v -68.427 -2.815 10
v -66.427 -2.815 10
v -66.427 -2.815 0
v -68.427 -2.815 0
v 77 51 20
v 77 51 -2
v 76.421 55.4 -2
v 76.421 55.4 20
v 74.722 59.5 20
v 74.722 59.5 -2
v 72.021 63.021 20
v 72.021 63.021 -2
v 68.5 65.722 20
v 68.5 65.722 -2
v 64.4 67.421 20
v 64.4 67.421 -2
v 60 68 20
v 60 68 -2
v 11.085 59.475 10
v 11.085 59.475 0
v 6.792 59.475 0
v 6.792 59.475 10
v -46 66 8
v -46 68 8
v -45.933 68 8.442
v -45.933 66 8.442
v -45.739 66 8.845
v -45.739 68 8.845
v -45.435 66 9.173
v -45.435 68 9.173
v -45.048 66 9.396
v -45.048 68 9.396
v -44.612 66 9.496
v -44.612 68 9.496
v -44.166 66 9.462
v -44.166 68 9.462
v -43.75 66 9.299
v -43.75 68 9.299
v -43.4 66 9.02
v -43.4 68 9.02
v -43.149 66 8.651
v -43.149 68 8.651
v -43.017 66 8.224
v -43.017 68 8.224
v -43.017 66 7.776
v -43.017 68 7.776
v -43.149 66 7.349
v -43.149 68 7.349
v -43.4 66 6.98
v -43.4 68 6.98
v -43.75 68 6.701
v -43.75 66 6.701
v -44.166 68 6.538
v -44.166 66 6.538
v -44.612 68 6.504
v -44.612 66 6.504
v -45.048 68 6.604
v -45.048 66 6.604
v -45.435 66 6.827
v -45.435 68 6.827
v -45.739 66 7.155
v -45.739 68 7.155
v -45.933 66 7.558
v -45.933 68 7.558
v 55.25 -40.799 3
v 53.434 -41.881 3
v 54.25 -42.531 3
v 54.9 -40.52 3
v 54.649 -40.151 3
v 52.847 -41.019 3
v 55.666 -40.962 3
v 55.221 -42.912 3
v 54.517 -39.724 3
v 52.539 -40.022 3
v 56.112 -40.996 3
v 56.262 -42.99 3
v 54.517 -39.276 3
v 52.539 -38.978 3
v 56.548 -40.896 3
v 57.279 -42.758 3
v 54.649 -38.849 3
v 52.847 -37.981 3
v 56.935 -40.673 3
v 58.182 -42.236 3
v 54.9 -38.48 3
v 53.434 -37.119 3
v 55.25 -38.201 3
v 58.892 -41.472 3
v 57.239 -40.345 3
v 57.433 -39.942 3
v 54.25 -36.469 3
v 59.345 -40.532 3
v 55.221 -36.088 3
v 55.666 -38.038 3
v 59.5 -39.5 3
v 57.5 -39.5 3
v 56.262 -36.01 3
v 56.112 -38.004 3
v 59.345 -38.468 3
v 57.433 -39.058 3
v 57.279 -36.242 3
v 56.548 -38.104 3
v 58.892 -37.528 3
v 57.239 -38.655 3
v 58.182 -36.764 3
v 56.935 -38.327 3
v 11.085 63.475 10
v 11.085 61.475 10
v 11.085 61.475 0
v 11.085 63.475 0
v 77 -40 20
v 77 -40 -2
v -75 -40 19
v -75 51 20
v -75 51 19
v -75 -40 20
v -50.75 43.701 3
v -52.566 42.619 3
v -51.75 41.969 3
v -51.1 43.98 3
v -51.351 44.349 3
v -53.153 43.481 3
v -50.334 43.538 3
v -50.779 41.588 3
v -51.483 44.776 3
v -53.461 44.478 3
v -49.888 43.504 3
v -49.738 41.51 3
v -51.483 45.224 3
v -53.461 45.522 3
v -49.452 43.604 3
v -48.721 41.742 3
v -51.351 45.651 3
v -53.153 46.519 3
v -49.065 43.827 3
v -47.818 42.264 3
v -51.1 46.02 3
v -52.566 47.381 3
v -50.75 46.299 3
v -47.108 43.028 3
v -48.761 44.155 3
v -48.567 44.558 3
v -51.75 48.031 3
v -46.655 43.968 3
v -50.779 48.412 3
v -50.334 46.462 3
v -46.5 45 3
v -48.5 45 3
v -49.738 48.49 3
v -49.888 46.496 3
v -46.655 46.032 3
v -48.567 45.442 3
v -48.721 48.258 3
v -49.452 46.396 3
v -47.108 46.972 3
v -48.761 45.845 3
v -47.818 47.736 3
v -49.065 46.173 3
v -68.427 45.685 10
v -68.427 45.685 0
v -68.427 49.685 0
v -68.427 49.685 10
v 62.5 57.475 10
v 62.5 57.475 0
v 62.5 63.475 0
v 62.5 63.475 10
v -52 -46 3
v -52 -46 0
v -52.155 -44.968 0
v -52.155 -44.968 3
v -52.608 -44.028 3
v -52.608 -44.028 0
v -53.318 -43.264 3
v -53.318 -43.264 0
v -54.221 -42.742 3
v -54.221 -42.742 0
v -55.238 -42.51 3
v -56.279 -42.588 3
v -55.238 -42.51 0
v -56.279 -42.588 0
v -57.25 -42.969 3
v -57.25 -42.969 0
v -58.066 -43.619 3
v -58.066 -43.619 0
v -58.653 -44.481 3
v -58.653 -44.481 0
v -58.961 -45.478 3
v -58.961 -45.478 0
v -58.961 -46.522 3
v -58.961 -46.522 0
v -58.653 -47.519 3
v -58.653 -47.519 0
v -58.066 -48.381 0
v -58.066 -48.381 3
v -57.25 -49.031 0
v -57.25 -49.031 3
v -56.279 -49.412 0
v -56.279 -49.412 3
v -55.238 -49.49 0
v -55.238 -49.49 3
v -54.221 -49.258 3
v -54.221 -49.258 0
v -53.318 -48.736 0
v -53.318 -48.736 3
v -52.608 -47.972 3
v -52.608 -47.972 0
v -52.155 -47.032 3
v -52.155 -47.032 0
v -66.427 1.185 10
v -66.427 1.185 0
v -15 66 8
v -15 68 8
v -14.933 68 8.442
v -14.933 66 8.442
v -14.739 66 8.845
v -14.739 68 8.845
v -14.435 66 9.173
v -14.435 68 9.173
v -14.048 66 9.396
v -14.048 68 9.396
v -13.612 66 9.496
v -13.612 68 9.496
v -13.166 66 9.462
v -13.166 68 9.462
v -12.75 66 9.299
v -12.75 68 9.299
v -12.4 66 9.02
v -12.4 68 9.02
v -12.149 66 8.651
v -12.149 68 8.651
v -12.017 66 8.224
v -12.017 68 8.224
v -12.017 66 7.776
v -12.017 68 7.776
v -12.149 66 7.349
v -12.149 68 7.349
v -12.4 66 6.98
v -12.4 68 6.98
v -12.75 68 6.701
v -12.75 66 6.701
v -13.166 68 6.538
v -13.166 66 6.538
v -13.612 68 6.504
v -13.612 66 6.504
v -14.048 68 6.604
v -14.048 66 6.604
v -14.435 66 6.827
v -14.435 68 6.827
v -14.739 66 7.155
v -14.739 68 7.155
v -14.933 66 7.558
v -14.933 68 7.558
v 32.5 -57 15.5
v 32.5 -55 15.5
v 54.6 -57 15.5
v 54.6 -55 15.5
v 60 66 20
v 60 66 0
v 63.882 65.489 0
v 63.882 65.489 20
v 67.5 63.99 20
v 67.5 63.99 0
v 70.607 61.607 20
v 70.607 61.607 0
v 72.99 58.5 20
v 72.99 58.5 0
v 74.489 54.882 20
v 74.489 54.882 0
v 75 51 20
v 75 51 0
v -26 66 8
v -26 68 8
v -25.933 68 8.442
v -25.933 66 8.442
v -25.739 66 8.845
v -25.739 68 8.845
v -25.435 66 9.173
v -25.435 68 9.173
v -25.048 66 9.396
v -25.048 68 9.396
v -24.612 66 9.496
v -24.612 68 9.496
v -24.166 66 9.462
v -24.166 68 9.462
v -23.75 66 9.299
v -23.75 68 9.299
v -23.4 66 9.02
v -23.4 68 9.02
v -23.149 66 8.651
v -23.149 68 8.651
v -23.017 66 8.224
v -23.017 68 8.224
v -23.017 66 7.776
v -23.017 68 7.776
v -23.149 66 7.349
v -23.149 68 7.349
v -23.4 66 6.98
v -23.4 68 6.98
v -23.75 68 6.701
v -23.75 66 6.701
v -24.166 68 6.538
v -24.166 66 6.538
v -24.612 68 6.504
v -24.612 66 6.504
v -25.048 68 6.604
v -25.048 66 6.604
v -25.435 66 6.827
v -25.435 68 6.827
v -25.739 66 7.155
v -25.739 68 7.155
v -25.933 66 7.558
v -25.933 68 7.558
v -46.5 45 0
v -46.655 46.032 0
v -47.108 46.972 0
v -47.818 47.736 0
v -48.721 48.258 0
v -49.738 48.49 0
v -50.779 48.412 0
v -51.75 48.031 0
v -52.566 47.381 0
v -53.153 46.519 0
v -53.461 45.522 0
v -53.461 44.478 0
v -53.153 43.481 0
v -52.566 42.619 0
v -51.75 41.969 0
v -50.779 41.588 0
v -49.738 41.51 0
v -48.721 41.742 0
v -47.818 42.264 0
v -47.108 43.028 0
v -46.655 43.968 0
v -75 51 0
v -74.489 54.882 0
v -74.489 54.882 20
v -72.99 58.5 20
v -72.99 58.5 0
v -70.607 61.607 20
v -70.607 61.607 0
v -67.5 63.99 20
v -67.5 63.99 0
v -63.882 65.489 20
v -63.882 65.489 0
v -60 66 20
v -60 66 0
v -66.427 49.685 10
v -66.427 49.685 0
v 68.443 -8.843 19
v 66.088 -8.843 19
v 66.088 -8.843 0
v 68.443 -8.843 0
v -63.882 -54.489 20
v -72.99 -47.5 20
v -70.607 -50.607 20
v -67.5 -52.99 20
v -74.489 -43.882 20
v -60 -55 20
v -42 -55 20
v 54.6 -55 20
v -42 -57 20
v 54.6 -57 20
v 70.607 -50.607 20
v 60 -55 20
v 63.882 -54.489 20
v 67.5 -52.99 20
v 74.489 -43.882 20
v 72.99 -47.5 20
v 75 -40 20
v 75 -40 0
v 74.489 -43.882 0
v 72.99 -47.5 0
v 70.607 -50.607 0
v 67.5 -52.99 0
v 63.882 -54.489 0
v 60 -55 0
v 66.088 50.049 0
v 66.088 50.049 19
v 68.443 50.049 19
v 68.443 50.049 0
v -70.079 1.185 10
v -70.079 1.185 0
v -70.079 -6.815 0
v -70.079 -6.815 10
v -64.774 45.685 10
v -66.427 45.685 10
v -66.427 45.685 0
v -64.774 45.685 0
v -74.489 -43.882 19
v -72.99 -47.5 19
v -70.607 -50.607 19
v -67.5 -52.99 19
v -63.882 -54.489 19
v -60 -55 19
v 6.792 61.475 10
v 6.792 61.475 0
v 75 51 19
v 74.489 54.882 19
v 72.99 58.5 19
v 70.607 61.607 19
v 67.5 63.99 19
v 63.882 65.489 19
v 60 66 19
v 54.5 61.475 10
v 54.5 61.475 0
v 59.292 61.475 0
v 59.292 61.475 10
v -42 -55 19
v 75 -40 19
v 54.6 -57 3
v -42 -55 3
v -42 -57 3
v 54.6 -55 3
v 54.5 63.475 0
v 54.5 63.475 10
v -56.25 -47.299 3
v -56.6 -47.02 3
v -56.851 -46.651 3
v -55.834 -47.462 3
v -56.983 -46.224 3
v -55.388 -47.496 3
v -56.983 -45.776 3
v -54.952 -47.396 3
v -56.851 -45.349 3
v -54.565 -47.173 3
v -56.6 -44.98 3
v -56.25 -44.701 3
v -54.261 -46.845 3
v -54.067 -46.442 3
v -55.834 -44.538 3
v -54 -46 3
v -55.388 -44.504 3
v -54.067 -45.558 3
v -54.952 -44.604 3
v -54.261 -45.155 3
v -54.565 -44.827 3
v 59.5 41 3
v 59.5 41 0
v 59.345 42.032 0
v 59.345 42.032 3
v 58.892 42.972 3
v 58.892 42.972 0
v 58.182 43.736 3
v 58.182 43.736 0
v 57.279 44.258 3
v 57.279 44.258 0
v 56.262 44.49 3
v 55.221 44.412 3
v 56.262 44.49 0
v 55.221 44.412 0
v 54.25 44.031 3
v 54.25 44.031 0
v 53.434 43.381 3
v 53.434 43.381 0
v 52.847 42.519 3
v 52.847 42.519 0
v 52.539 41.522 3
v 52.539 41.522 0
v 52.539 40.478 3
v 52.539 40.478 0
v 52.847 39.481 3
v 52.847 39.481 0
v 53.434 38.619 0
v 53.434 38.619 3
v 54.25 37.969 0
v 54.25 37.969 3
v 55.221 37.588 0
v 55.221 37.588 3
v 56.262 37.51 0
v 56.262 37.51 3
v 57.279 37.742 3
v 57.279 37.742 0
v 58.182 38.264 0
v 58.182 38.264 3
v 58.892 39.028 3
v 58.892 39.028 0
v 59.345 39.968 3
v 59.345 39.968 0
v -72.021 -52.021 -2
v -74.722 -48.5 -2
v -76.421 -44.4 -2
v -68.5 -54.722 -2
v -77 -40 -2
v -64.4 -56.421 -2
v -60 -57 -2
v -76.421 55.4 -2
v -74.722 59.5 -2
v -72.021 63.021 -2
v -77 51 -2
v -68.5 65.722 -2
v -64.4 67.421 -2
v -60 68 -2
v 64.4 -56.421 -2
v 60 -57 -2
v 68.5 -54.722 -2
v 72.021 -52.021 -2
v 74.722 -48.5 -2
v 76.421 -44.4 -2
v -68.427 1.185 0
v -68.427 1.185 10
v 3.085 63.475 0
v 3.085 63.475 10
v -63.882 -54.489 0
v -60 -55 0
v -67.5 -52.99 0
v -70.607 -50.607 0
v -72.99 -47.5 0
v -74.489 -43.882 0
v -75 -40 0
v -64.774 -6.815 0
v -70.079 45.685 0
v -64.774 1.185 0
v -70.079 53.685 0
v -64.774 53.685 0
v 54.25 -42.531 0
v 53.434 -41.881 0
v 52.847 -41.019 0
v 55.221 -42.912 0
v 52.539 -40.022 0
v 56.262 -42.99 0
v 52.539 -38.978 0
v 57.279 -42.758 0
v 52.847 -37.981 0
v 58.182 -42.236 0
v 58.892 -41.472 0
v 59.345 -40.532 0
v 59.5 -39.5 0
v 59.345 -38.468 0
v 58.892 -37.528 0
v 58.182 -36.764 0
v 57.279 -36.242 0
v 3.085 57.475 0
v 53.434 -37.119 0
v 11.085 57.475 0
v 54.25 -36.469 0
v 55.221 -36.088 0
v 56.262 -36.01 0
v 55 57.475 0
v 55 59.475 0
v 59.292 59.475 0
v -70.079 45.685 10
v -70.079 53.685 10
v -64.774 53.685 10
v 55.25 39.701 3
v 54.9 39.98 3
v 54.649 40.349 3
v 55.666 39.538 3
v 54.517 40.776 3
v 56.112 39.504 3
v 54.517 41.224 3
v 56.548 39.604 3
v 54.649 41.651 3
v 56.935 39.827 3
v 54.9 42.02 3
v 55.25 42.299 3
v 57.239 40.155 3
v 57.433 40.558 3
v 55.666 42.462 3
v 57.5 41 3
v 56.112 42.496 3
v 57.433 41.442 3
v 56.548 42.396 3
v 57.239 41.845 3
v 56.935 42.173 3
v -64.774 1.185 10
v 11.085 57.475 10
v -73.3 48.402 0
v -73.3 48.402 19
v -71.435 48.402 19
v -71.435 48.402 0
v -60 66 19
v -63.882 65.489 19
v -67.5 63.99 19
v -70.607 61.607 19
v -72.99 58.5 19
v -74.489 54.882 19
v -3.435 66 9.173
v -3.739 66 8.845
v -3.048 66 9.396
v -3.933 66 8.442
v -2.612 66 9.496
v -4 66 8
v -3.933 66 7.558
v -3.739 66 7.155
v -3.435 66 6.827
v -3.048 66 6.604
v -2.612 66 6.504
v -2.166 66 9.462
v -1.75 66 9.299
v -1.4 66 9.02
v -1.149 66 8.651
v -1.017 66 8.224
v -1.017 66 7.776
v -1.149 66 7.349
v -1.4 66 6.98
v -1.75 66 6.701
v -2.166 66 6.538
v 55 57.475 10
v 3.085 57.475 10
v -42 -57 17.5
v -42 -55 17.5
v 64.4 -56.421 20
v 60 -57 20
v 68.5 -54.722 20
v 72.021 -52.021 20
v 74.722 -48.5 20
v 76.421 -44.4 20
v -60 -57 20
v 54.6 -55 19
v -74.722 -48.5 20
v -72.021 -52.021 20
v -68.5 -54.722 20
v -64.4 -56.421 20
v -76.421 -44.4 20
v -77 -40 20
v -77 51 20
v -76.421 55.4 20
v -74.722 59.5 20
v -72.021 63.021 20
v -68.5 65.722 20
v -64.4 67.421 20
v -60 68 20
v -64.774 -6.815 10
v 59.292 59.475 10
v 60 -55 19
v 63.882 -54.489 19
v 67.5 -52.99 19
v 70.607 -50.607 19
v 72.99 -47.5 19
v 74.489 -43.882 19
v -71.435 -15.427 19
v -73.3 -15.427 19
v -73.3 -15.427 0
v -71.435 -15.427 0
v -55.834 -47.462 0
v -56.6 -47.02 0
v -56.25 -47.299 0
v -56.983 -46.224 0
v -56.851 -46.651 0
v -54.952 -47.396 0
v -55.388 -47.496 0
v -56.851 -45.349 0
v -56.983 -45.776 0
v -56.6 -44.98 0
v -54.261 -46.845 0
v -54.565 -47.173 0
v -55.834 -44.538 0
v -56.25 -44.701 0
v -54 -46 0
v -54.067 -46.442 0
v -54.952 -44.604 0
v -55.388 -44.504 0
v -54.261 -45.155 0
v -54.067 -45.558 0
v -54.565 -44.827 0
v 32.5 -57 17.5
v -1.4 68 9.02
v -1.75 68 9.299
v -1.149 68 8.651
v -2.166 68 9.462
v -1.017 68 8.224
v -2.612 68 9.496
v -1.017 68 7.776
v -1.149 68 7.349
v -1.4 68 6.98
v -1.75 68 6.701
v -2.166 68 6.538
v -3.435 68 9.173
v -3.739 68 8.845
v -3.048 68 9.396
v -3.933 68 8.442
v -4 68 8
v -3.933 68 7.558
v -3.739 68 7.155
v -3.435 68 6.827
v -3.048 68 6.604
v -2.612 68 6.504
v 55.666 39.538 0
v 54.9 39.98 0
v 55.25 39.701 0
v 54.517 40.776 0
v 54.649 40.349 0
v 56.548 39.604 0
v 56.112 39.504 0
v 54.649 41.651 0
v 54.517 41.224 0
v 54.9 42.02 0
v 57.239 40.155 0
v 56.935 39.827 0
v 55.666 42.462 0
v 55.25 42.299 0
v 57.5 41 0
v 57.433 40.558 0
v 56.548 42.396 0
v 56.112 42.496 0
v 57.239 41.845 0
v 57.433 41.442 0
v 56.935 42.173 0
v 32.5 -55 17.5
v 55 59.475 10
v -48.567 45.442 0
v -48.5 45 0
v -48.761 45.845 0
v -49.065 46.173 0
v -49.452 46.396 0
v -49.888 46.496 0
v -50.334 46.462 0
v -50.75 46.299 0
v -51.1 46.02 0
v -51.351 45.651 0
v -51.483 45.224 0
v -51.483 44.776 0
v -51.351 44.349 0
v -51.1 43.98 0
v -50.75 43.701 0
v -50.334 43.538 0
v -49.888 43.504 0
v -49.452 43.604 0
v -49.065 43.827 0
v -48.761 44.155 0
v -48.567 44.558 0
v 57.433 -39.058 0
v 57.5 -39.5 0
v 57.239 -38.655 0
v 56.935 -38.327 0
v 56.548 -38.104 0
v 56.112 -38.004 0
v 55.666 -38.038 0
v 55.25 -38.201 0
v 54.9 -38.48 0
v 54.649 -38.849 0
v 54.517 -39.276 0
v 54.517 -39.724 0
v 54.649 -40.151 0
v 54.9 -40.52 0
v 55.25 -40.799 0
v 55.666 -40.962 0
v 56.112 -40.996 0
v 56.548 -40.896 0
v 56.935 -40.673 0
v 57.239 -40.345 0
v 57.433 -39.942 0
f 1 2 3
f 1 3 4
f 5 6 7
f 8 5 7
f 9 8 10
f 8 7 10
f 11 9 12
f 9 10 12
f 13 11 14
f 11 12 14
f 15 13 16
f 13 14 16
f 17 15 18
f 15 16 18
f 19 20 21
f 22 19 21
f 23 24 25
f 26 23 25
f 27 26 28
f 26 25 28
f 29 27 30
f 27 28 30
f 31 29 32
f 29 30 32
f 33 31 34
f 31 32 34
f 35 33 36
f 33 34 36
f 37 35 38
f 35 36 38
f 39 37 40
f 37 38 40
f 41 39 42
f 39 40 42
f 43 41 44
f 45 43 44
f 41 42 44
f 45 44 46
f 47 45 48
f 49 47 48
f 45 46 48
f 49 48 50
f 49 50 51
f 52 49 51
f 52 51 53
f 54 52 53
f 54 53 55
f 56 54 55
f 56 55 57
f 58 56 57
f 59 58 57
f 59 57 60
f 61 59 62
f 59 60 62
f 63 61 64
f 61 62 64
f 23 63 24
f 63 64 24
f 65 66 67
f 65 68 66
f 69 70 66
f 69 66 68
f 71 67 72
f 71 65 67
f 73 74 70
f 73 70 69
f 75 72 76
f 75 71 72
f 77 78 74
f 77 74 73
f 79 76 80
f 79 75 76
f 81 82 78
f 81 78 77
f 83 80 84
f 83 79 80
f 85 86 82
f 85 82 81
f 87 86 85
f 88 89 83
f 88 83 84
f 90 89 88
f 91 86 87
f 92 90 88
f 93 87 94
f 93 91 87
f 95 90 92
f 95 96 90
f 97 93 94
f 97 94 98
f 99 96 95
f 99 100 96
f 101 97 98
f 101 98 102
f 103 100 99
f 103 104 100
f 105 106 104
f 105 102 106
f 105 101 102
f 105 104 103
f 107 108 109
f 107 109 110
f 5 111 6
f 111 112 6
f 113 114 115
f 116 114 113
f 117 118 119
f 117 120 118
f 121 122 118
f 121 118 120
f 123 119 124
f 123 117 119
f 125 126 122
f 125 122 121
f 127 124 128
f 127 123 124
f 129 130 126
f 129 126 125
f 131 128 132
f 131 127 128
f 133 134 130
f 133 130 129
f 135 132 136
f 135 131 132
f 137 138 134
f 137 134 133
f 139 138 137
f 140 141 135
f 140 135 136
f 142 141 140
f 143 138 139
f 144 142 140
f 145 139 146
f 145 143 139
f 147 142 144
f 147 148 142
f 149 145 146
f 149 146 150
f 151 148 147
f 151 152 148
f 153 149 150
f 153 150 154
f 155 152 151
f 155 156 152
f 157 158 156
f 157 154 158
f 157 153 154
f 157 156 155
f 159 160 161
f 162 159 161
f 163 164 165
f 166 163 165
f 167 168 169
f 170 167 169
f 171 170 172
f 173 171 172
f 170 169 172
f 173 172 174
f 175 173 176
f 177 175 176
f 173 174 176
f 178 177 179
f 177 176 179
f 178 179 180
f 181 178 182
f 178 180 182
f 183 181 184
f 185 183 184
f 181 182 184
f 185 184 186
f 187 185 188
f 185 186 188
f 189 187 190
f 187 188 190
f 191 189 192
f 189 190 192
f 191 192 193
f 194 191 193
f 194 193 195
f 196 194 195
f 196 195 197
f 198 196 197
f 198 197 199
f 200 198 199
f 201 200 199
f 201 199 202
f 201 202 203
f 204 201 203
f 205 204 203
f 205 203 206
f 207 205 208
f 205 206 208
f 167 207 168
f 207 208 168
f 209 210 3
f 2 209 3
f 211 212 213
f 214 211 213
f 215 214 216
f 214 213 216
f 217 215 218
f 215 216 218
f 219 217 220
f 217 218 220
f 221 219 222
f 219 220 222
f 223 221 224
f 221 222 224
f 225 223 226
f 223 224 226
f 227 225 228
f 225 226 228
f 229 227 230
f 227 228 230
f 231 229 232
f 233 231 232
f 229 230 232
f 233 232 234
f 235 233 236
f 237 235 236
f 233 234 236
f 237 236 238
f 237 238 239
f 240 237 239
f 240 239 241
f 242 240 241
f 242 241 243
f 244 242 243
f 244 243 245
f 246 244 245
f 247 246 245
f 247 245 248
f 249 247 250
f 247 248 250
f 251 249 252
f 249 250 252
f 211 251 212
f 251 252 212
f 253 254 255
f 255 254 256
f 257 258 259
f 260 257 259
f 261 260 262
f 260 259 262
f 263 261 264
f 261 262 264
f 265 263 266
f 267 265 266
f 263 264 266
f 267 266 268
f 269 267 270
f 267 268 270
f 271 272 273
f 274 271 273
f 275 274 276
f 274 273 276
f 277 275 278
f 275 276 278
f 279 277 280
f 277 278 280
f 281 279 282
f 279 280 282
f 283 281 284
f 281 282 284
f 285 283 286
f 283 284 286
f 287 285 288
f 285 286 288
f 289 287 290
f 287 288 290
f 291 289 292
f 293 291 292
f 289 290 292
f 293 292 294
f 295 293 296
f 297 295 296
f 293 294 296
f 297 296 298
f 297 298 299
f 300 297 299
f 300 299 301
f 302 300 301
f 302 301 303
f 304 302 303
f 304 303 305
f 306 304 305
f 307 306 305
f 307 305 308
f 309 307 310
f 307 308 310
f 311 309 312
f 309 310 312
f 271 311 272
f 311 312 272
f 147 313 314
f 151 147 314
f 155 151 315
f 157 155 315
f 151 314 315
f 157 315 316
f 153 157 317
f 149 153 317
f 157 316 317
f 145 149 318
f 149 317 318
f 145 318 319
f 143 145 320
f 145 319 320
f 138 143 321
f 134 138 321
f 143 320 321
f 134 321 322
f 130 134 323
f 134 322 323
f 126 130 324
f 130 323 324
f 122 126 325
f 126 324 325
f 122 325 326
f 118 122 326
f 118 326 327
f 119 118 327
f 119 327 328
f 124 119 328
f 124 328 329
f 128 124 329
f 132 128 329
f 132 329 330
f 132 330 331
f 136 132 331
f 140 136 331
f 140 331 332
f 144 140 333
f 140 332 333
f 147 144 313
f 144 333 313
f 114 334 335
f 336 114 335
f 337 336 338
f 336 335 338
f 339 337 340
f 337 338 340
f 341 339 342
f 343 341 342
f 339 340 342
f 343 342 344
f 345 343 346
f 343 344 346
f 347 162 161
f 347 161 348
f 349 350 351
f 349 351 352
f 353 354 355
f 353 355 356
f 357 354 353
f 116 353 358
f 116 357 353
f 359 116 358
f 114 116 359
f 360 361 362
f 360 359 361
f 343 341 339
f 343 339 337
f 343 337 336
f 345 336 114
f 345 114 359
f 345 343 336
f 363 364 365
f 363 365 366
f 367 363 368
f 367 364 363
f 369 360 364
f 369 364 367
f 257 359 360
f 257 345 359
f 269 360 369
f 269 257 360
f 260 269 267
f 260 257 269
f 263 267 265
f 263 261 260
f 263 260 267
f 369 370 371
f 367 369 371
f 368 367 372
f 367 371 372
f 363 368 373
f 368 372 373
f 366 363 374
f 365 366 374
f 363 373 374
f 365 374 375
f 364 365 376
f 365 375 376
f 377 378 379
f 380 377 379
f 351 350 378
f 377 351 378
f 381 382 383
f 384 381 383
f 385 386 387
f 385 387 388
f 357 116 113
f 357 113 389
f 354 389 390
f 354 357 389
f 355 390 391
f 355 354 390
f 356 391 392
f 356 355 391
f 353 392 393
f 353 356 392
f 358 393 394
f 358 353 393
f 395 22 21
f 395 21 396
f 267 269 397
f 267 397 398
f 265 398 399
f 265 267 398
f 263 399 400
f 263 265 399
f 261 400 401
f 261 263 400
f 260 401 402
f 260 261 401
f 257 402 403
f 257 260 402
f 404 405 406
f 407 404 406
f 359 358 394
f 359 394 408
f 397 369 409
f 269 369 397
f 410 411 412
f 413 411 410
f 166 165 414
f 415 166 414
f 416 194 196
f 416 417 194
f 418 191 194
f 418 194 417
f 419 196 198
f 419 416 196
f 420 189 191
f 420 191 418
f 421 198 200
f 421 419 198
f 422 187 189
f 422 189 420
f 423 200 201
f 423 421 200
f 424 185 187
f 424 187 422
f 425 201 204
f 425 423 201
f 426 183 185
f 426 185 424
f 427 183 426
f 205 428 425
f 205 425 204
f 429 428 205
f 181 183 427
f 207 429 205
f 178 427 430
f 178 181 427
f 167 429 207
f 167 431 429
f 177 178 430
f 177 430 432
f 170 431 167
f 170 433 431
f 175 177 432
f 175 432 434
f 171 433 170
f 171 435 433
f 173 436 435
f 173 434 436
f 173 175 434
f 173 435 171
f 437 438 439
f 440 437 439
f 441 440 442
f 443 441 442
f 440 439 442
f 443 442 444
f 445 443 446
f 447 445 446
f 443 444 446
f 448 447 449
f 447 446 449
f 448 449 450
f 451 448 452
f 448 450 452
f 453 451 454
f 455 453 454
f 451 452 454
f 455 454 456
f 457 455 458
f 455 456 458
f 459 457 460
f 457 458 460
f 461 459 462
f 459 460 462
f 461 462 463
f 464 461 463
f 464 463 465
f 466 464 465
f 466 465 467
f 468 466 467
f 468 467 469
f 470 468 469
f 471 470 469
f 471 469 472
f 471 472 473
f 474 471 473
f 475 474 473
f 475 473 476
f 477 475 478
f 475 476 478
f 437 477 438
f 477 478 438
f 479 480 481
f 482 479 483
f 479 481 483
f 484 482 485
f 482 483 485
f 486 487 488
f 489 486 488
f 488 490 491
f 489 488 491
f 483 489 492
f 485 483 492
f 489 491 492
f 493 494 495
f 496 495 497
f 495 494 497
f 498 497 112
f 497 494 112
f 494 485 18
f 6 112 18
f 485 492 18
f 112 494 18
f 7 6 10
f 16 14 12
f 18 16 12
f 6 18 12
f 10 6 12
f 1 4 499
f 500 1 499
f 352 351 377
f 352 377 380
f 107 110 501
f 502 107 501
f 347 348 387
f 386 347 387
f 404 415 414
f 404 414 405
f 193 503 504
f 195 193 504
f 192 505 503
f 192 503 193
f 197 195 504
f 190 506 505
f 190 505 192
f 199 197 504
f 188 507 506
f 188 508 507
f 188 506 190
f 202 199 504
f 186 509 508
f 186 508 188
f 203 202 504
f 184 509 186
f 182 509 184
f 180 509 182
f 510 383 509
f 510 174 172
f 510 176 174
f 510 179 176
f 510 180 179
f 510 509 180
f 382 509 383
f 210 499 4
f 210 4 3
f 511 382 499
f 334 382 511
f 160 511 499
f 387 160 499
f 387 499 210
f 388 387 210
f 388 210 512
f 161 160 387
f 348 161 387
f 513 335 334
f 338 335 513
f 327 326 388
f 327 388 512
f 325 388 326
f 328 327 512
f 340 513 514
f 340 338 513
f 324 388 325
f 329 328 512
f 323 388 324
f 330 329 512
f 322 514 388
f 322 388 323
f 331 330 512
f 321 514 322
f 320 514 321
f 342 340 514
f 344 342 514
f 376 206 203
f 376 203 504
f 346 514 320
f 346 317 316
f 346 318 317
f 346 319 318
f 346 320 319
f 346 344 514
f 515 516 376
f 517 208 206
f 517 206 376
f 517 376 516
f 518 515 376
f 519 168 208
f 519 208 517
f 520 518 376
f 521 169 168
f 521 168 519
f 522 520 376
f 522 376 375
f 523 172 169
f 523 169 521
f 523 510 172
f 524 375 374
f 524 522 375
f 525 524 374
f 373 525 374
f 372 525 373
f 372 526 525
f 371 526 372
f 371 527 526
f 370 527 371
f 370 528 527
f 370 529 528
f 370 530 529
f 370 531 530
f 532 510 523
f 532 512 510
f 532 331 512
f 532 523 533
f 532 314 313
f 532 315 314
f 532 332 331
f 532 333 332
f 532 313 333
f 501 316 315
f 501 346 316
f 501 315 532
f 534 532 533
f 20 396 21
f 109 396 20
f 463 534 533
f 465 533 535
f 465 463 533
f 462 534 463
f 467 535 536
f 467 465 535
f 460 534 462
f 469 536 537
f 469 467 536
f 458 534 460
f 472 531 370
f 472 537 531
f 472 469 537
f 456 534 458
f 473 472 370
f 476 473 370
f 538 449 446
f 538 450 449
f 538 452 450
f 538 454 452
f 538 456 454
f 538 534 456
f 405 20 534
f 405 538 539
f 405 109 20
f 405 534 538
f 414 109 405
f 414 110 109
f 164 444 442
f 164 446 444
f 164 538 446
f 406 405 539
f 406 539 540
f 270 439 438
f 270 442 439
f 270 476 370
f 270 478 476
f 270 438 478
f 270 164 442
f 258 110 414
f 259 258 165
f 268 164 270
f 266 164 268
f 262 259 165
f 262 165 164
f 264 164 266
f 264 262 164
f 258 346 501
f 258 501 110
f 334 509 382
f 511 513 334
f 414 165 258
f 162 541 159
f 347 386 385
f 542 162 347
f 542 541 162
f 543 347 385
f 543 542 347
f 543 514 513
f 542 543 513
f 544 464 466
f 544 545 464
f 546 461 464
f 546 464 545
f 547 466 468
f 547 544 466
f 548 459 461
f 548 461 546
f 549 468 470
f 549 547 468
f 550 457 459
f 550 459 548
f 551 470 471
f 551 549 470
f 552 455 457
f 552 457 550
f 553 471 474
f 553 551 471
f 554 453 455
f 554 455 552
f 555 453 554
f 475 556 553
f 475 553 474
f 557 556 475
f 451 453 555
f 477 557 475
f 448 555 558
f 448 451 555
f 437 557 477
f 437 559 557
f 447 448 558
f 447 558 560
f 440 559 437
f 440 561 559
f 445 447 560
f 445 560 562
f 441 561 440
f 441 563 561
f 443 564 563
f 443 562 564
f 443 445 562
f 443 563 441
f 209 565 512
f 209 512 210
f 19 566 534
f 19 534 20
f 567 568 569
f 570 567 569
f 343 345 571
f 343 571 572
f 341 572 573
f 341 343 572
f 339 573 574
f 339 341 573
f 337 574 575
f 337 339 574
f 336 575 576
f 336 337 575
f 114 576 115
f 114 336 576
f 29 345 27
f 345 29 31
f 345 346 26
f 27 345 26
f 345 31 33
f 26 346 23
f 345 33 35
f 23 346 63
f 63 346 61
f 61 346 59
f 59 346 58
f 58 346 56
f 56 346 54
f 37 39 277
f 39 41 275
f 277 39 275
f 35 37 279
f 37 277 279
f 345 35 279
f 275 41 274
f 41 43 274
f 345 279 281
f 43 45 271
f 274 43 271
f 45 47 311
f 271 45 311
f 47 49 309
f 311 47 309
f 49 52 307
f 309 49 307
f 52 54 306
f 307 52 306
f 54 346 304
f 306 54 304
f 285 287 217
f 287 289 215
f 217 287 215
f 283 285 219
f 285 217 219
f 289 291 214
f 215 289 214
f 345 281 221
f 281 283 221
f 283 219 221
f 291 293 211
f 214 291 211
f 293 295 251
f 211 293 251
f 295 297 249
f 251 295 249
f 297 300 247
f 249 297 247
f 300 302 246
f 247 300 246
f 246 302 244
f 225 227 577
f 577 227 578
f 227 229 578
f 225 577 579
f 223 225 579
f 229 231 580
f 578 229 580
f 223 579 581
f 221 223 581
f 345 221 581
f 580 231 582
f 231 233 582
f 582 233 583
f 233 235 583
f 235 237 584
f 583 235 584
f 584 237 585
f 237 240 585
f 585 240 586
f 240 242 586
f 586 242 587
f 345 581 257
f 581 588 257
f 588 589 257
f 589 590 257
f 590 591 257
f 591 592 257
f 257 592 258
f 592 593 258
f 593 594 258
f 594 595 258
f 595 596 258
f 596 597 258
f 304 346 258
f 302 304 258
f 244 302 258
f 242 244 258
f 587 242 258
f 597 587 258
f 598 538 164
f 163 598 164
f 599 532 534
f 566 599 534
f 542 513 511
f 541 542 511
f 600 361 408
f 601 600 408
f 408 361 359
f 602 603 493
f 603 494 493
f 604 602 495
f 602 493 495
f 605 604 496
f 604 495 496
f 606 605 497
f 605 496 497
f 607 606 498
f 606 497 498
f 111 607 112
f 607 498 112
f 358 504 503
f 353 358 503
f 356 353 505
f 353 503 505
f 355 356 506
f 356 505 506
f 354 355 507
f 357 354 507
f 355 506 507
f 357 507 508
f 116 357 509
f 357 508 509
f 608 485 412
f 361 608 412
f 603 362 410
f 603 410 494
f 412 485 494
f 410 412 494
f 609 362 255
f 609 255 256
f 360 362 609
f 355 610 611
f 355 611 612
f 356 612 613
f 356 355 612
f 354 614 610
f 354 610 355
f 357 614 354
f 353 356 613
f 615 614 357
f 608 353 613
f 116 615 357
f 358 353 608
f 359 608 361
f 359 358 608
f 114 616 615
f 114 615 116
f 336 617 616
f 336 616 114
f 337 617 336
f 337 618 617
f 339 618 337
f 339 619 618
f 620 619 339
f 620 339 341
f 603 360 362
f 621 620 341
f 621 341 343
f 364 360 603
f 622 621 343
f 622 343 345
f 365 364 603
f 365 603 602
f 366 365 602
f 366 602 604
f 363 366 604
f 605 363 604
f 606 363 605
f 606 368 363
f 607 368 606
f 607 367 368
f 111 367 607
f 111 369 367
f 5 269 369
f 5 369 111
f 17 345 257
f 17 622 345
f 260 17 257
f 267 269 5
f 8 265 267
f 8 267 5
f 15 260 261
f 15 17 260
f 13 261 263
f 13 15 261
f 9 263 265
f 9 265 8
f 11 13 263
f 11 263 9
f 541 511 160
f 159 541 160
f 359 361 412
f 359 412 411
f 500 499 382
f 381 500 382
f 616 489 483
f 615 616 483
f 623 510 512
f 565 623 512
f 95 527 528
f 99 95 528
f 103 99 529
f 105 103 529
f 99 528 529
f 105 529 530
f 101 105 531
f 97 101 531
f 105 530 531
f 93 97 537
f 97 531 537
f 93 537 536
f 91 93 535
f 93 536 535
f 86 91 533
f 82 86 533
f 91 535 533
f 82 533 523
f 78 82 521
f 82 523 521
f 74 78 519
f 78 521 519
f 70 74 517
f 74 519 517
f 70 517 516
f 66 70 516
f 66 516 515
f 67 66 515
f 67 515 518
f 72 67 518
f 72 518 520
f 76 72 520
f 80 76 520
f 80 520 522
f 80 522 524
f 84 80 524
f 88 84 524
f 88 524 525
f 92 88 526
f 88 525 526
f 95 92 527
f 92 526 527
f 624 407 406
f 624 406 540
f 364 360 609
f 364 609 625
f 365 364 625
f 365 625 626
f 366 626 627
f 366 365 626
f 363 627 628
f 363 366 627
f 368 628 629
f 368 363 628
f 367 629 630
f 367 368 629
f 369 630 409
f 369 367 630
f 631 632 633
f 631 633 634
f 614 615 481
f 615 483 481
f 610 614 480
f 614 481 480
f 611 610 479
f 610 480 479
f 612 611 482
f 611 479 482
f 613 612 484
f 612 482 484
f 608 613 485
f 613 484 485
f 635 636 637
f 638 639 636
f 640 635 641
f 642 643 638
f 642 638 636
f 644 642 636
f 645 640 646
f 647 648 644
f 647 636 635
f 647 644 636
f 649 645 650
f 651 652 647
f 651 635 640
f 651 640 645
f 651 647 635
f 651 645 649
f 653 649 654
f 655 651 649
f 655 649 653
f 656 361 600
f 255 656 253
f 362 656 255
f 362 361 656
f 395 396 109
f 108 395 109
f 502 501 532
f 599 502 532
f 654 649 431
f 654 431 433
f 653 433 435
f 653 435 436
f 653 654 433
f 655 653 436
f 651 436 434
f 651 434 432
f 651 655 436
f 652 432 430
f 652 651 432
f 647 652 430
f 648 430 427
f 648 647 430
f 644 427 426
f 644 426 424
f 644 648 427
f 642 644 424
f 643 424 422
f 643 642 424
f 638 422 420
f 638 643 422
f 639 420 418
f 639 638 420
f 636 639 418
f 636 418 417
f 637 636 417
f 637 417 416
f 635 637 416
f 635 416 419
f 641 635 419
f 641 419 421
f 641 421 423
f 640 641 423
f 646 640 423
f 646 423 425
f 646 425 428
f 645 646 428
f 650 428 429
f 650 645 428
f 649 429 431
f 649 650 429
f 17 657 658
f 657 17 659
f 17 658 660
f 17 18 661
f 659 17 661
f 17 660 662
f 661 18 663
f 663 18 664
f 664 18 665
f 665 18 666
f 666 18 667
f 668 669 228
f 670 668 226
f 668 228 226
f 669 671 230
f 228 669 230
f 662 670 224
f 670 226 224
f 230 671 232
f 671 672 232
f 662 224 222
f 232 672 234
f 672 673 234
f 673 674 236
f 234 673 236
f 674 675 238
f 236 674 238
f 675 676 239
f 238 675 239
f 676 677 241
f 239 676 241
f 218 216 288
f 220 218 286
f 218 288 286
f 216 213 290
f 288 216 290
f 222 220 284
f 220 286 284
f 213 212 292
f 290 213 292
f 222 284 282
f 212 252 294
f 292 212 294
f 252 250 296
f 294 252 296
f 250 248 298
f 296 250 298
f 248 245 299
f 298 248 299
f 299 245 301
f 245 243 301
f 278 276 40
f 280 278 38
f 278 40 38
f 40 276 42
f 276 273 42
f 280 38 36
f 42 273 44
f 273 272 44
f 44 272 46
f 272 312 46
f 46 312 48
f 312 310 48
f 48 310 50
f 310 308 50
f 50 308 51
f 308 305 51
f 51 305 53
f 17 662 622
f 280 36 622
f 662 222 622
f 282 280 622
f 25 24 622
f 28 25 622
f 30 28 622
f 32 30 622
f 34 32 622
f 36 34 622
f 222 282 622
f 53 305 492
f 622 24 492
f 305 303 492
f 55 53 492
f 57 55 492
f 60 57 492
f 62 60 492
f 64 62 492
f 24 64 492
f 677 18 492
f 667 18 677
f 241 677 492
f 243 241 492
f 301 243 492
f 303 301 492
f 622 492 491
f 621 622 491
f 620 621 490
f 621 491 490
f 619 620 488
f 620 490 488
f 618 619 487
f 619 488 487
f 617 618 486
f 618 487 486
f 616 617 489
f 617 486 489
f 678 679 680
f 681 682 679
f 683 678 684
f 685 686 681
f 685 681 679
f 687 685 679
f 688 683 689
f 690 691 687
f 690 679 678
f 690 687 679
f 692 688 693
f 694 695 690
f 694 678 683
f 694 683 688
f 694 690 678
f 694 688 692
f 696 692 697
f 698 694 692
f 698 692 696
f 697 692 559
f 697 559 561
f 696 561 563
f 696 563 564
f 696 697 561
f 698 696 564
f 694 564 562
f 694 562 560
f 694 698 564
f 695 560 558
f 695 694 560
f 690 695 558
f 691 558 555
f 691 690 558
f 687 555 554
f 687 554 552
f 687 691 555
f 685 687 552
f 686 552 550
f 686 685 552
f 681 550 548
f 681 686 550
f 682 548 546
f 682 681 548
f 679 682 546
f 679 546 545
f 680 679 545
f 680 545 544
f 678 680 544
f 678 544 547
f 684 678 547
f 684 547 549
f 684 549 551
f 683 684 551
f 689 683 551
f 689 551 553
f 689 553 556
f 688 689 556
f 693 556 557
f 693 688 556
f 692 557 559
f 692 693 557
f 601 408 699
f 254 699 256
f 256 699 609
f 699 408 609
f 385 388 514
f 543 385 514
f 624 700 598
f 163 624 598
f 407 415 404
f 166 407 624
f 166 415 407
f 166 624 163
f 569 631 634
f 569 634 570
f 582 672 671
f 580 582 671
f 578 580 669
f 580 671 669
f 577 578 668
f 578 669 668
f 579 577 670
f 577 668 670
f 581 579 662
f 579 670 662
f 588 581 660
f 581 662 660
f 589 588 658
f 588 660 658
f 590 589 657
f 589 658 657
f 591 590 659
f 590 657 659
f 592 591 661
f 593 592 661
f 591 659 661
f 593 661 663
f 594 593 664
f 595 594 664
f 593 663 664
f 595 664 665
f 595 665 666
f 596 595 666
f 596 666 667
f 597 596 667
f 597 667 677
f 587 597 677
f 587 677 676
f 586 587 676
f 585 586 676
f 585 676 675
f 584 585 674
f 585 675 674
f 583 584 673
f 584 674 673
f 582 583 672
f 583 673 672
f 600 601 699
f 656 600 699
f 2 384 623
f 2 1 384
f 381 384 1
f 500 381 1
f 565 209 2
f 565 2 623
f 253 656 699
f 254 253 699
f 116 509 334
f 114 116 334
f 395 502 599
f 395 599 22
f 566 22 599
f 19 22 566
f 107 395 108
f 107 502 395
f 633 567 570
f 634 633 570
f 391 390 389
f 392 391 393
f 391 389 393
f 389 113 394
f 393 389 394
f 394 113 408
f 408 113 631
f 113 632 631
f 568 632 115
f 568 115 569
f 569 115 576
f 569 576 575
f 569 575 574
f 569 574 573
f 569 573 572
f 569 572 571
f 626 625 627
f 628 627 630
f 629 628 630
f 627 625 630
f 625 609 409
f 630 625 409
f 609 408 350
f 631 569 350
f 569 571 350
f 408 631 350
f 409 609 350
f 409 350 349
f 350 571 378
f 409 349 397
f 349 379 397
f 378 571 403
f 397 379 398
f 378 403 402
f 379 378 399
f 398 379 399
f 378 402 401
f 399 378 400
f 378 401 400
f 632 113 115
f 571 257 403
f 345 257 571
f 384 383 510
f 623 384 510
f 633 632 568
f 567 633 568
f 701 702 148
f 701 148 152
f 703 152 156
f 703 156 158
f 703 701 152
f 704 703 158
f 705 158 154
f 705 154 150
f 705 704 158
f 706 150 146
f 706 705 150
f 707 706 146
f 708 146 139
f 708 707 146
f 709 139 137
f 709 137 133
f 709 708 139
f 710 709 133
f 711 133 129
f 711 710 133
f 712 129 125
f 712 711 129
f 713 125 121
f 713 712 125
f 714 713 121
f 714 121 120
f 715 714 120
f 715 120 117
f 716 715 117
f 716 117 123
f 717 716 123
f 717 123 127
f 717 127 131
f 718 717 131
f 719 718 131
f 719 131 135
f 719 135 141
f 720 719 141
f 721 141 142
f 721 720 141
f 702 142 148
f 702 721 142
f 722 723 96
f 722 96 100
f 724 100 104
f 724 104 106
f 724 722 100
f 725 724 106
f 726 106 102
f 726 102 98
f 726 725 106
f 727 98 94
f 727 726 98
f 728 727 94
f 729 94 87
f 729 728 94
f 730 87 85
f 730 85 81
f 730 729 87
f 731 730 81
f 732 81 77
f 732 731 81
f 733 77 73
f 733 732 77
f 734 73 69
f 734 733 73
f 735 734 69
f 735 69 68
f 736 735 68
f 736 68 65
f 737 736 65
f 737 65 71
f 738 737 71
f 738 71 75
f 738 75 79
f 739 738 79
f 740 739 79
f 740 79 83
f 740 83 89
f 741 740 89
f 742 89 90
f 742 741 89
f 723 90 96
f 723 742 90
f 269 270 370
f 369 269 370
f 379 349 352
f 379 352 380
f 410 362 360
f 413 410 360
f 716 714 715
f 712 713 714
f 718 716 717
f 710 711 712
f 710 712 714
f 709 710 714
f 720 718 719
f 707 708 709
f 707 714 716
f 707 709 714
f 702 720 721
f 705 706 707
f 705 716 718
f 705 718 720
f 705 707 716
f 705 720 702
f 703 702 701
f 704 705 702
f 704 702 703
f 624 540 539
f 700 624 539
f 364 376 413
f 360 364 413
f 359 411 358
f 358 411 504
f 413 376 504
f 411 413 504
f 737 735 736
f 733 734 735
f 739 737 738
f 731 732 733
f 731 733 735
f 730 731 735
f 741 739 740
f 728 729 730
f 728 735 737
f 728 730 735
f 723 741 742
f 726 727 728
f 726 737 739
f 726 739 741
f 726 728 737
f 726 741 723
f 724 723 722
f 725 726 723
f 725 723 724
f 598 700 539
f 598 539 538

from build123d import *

# Parameters (mm, degrees)
F0_W      = 120
F0_H      = 110
F0_R      = 3.5
F0_R_2    = 1.5
F1_DEPTH  = 2
F2_DEPTH  = 20
F3_DEPTH  = 3
F4_DEPTH  = 10
F5_W      = 96.6
F5_H      = 2
F6_DEPTH  = 17
F7_R      = 1.5
F8_DEPTH  = 2
F9_W      = 1.8643289804
F9_H      = 63.8286471367
F9_W_2    = 2.3556724191
F9_H_2    = 58.8918318972
F10_DEPTH = 1
F9_W_3    = 74.5
F9_H_3    = 2
F11_DEPTH = 2.5
F9_W_4    = 22.1
F12_DEPTH = 4.5
F13_DEPTH = 20


with BuildPart() as f1:
    # F0 (on Top) → F1 (new body)
    with BuildSketch(Plane.XY):
        with BuildLine():
            Line((-77, 51), (-77, -40))
            ThreePointArc((-77, -40), (-72.0208152802, -52.0208152802), (-60, -57))
            Line((-60, -57), (60, -57))
            ThreePointArc((60, -57), (72.0208152802, -52.0208152802), (77, -40))
            Line((77, -40), (77, 51))
            ThreePointArc((77, 51), (72.0208152802, 63.0208152802), (60, 68))
            Line((60, 68), (-60, 68))
            ThreePointArc((-60, 68), (-72.0208152802, 63.0208152802), (-77, 51))
        make_face()
        with BuildLine():
            Line((60, -55), (-60, -55))
            ThreePointArc((-60, -55), (-70.6066017178, -50.6066017178), (-75, -40))
            Line((-75, -40), (-75, 51))
            ThreePointArc((-75, 51), (-70.6066017178, 61.6066017178), (-60, 66))
            Line((-60, 66), (60, 66))
            ThreePointArc((60, 66), (70.6066017178, 61.6066017178), (75, 51))
            Line((75, 51), (75, -40))
            ThreePointArc((75, -40), (70.6066017178, -50.6066017178), (60, -55))
        make_face(mode=Mode.SUBTRACT)
        Rectangle(F0_W, F0_H)
        with Locations((-55.5, -46)):
            Circle(F0_R, mode=Mode.SUBTRACT)
        with Locations((56, -39.5)):
            Circle(F0_R, mode=Mode.SUBTRACT)
        with Locations((-50, 45)):
            Circle(F0_R, mode=Mode.SUBTRACT)
        with Locations((56, 41)):
            Circle(F0_R, mode=Mode.SUBTRACT)
        with BuildLine():
            ThreePointArc((-75, -40), (-70.6066017178, -50.6066017178), (-60, -55))
            Line((-60, -55), (-60, 55))
            Line((-60, 55), (60, 55))
            Line((60, 55), (60, -55))
            ThreePointArc((60, -55), (70.6066017178, -50.6066017178), (75, -40))
            Line((75, -40), (75, 51))
            ThreePointArc((75, 51), (70.6066017178, 61.6066017178), (60, 66))
            Line((60, 66), (-60, 66))
            ThreePointArc((-60, 66), (-70.6066017178, 61.6066017178), (-75, 51))
            Line((-75, 51), (-75, -40))
        make_face()
        Polygon((-68.426687021, -2.8152682781), (-66.426687021, -2.8152682781), (-66.426687021, 1.1847317219), (-64.77445364, 1.1847317219), (-64.77445364, -6.8152682781), (-70.078920402, -6.8152682781), (-70.078920402, 1.1847317219), (-68.426687021, 1.1847317219), align=None, mode=Mode.SUBTRACT)
        Polygon((-68.426687021, 45.6847317219), (-70.078920402, 45.6847317219), (-70.078920402, 53.6847317219), (-64.77445364, 53.6847317219), (-64.77445364, 45.6847317219), (-66.426687021, 45.6847317219), (-66.426687021, 49.6847317219), (-68.426687021, 49.6847317219), align=None, mode=Mode.SUBTRACT)
        Polygon((11.0850978998, 61.4750083983), (6.792485714, 61.4750083983), (6.792485714, 59.4750083983), (11.0850978998, 59.4750083983), (11.0850978998, 57.4750083983), (3.0850978998, 57.4750083983), (3.0850978998, 63.4750083983), (11.0850978998, 63.4750083983), align=None, mode=Mode.SUBTRACT)
        Polygon((59.292485714, 59.4750083983), (59.292485714, 61.4750083983), (54.4998735282, 61.4750083983), (54.4998735282, 63.4750083983), (62.4998735282, 63.4750083983), (62.4998735282, 57.4750083983), (54.9998735282, 57.4750083983), (54.9998735282, 59.4750083983), align=None, mode=Mode.SUBTRACT)
        Polygon((6.792485714, 59.4750083983), (6.792485714, 61.4750083983), (11.0850978998, 61.4750083983), (11.0850978998, 63.4750083983), (3.0850978998, 63.4750083983), (3.0850978998, 57.4750083983), (11.0850978998, 57.4750083983), (11.0850978998, 59.4750083983), align=None)
        with Locations((56, -39.5)):
            Circle(F0_R)
        with Locations((56, -39.5)):
            Circle(F0_R_2, mode=Mode.SUBTRACT)
        with Locations((-50, 45)):
            Circle(F0_R)
        with Locations((-50, 45)):
            Circle(F0_R_2, mode=Mode.SUBTRACT)
        with Locations((56, 41)):
            Circle(F0_R)
        with Locations((56, 41)):
            Circle(F0_R_2, mode=Mode.SUBTRACT)
        with Locations((-55.5, -46)):
            Circle(F0_R)
        with Locations((-55.5, -46)):
            Circle(F0_R_2, mode=Mode.SUBTRACT)
        Polygon((54.4998735282, 61.4750083983), (59.292485714, 61.4750083983), (59.292485714, 59.4750083983), (54.9998735282, 59.4750083983), (54.9998735282, 57.4750083983), (62.4998735282, 57.4750083983), (62.4998735282, 63.4750083983), (54.4998735282, 63.4750083983), align=None)
        Polygon((-70.078920402, 53.6847317219), (-70.078920402, 45.6847317219), (-68.426687021, 45.6847317219), (-68.426687021, 49.6847317219), (-66.426687021, 49.6847317219), (-66.426687021, 45.6847317219), (-64.77445364, 45.6847317219), (-64.77445364, 53.6847317219), align=None)
        Polygon((-66.426687021, 1.1847317219), (-66.426687021, -2.8152682781), (-68.426687021, -2.8152682781), (-68.426687021, 1.1847317219), (-70.078920402, 1.1847317219), (-70.078920402, -6.8152682781), (-64.77445364, -6.8152682781), (-64.77445364, 1.1847317219), align=None)
        with Locations((-55.5, -46)):
            Circle(F0_R_2)
        with Locations((56, 41)):
            Circle(F0_R_2)
        with Locations((-50, 45)):
            Circle(F0_R_2)
        with Locations((56, -39.5)):
            Circle(F0_R_2)
    extrude(amount=-F1_DEPTH)

    # F0 (on Top) → F2 (join)
    with BuildSketch(Plane.XY):
        with BuildLine():
            Line((-77, 51), (-77, -40))
            ThreePointArc((-77, -40), (-72.0208152802, -52.0208152802), (-60, -57))
            Line((-60, -57), (60, -57))
            ThreePointArc((60, -57), (72.0208152802, -52.0208152802), (77, -40))
            Line((77, -40), (77, 51))
            ThreePointArc((77, 51), (72.0208152802, 63.0208152802), (60, 68))
            Line((60, 68), (-60, 68))
            ThreePointArc((-60, 68), (-72.0208152802, 63.0208152802), (-77, 51))
        make_face()
        with BuildLine():
            Line((60, -55), (-60, -55))
            ThreePointArc((-60, -55), (-70.6066017178, -50.6066017178), (-75, -40))
            Line((-75, -40), (-75, 51))
            ThreePointArc((-75, 51), (-70.6066017178, 61.6066017178), (-60, 66))
            Line((-60, 66), (60, 66))
            ThreePointArc((60, 66), (70.6066017178, 61.6066017178), (75, 51))
            Line((75, 51), (75, -40))
            ThreePointArc((75, -40), (70.6066017178, -50.6066017178), (60, -55))
        make_face(mode=Mode.SUBTRACT)
    extrude(amount=F2_DEPTH)

    # F0 (on Top) → F3 (join)
    with BuildSketch(Plane.XY):
        with Locations((-50, 45)):
            Circle(F0_R)
        with Locations((-50, 45)):
            Circle(F0_R_2, mode=Mode.SUBTRACT)
        with Locations((56, 41)):
            Circle(F0_R)
        with Locations((56, 41)):
            Circle(F0_R_2, mode=Mode.SUBTRACT)
        with Locations((56, -39.5)):
            Circle(F0_R)
        with Locations((56, -39.5)):
            Circle(F0_R_2, mode=Mode.SUBTRACT)
        with Locations((-55.5, -46)):
            Circle(F0_R)
        with Locations((-55.5, -46)):
            Circle(F0_R_2, mode=Mode.SUBTRACT)
    extrude(amount=F3_DEPTH)

    # F0 (on Top) → F4 (join)
    with BuildSketch(Plane.XY):
        Polygon((6.792485714, 59.4750083983), (6.792485714, 61.4750083983), (11.0850978998, 61.4750083983), (11.0850978998, 63.4750083983), (3.0850978998, 63.4750083983), (3.0850978998, 57.4750083983), (11.0850978998, 57.4750083983), (11.0850978998, 59.4750083983), align=None)
        Polygon((54.4998735282, 61.4750083983), (59.292485714, 61.4750083983), (59.292485714, 59.4750083983), (54.9998735282, 59.4750083983), (54.9998735282, 57.4750083983), (62.4998735282, 57.4750083983), (62.4998735282, 63.4750083983), (54.4998735282, 63.4750083983), align=None)
        Polygon((-66.426687021, 1.1847317219), (-66.426687021, -2.8152682781), (-68.426687021, -2.8152682781), (-68.426687021, 1.1847317219), (-70.078920402, 1.1847317219), (-70.078920402, -6.8152682781), (-64.77445364, -6.8152682781), (-64.77445364, 1.1847317219), align=None)
        Polygon((-70.078920402, 53.6847317219), (-70.078920402, 45.6847317219), (-68.426687021, 45.6847317219), (-68.426687021, 49.6847317219), (-66.426687021, 49.6847317219), (-66.426687021, 45.6847317219), (-64.77445364, 45.6847317219), (-64.77445364, 53.6847317219), align=None)
    extrude(amount=F4_DEPTH)

    # F5 (on face) → F6 (cut, through all)
    with BuildSketch(Plane.XY.offset(20)):
        with Locations((6.3, -56)):
            Rectangle(F5_W, F5_H)
    extrude(amount=-F6_DEPTH, mode=Mode.SUBTRACT)

    # F7 (on face) → F8 (cut, through all)
    with BuildSketch(Plane(origin=(0, 68, 0), x_dir=(-1, 0, 0), z_dir=(0, 1, 0))):
        with Locations((2.5, 8)):
            Circle(F7_R)
        with Locations((13.5, 8)):
            Circle(F7_R)
        with Locations((24.5, 8)):
            Circle(F7_R)
        with Locations((44.5, 8)):
            Circle(F7_R)
    extrude(amount=-F8_DEPTH, mode=Mode.SUBTRACT)


with BuildPart() as f10:
    # F9 (on face) → F10 (new body)
    with BuildSketch(Plane.XY.offset(20)):
        with BuildLine():
            Line((-75, 51), (-75, -40))
            ThreePointArc((-75, -40), (-70.6066017178, -50.6066017178), (-60, -55))
            Line((-60, -55), (-42, -55))
            Line((-42, -55), (32.5, -55))
            Line((32.5, -55), (54.6, -55))
            Line((54.6, -55), (60, -55))
            ThreePointArc((60, -55), (70.6066017178, -50.6066017178), (75, -40))
            Line((75, -40), (75, 51))
            ThreePointArc((75, 51), (70.6066017178, 61.6066017178), (60, 66))
            Line((60, 66), (-60, 66))
            ThreePointArc((-60, 66), (-70.6066017178, 61.6066017178), (-75, 51))
        make_face()
        with Locations((-72.3674446344, 16.4873562753)):
            Rectangle(F9_W, F9_H, mode=Mode.SUBTRACT)
        with Locations((67.2655664384, 20.6032958813)):
            Rectangle(F9_W_2, F9_H_2, mode=Mode.SUBTRACT)
    extrude(amount=-F10_DEPTH)

    # F9 (on face) → F11 (join)
    with BuildSketch(Plane.XY.offset(20)):
        with Locations((-4.75, -56)):
            Rectangle(F9_W_3, F9_H_3)
    extrude(amount=-F11_DEPTH)

    # F9 (on face) → F12 (join)
    with BuildSketch(Plane.XY.offset(20)):
        with Locations((43.55, -56)):
            Rectangle(F9_W_4, F9_H_3)
    extrude(amount=-F12_DEPTH)

    # F9 (on face) → F13 (join, through all)
    with BuildSketch(Plane.XY.offset(20)):
        with Locations((-72.3674446344, 16.4873562753)):
            Rectangle(F9_W, F9_H)
        with Locations((67.2655664384, 20.6032958813)):
            Rectangle(F9_W_2, F9_H_2)
    extrude(amount=-F13_DEPTH)


solid = Compound([f1.part, f10.part])
